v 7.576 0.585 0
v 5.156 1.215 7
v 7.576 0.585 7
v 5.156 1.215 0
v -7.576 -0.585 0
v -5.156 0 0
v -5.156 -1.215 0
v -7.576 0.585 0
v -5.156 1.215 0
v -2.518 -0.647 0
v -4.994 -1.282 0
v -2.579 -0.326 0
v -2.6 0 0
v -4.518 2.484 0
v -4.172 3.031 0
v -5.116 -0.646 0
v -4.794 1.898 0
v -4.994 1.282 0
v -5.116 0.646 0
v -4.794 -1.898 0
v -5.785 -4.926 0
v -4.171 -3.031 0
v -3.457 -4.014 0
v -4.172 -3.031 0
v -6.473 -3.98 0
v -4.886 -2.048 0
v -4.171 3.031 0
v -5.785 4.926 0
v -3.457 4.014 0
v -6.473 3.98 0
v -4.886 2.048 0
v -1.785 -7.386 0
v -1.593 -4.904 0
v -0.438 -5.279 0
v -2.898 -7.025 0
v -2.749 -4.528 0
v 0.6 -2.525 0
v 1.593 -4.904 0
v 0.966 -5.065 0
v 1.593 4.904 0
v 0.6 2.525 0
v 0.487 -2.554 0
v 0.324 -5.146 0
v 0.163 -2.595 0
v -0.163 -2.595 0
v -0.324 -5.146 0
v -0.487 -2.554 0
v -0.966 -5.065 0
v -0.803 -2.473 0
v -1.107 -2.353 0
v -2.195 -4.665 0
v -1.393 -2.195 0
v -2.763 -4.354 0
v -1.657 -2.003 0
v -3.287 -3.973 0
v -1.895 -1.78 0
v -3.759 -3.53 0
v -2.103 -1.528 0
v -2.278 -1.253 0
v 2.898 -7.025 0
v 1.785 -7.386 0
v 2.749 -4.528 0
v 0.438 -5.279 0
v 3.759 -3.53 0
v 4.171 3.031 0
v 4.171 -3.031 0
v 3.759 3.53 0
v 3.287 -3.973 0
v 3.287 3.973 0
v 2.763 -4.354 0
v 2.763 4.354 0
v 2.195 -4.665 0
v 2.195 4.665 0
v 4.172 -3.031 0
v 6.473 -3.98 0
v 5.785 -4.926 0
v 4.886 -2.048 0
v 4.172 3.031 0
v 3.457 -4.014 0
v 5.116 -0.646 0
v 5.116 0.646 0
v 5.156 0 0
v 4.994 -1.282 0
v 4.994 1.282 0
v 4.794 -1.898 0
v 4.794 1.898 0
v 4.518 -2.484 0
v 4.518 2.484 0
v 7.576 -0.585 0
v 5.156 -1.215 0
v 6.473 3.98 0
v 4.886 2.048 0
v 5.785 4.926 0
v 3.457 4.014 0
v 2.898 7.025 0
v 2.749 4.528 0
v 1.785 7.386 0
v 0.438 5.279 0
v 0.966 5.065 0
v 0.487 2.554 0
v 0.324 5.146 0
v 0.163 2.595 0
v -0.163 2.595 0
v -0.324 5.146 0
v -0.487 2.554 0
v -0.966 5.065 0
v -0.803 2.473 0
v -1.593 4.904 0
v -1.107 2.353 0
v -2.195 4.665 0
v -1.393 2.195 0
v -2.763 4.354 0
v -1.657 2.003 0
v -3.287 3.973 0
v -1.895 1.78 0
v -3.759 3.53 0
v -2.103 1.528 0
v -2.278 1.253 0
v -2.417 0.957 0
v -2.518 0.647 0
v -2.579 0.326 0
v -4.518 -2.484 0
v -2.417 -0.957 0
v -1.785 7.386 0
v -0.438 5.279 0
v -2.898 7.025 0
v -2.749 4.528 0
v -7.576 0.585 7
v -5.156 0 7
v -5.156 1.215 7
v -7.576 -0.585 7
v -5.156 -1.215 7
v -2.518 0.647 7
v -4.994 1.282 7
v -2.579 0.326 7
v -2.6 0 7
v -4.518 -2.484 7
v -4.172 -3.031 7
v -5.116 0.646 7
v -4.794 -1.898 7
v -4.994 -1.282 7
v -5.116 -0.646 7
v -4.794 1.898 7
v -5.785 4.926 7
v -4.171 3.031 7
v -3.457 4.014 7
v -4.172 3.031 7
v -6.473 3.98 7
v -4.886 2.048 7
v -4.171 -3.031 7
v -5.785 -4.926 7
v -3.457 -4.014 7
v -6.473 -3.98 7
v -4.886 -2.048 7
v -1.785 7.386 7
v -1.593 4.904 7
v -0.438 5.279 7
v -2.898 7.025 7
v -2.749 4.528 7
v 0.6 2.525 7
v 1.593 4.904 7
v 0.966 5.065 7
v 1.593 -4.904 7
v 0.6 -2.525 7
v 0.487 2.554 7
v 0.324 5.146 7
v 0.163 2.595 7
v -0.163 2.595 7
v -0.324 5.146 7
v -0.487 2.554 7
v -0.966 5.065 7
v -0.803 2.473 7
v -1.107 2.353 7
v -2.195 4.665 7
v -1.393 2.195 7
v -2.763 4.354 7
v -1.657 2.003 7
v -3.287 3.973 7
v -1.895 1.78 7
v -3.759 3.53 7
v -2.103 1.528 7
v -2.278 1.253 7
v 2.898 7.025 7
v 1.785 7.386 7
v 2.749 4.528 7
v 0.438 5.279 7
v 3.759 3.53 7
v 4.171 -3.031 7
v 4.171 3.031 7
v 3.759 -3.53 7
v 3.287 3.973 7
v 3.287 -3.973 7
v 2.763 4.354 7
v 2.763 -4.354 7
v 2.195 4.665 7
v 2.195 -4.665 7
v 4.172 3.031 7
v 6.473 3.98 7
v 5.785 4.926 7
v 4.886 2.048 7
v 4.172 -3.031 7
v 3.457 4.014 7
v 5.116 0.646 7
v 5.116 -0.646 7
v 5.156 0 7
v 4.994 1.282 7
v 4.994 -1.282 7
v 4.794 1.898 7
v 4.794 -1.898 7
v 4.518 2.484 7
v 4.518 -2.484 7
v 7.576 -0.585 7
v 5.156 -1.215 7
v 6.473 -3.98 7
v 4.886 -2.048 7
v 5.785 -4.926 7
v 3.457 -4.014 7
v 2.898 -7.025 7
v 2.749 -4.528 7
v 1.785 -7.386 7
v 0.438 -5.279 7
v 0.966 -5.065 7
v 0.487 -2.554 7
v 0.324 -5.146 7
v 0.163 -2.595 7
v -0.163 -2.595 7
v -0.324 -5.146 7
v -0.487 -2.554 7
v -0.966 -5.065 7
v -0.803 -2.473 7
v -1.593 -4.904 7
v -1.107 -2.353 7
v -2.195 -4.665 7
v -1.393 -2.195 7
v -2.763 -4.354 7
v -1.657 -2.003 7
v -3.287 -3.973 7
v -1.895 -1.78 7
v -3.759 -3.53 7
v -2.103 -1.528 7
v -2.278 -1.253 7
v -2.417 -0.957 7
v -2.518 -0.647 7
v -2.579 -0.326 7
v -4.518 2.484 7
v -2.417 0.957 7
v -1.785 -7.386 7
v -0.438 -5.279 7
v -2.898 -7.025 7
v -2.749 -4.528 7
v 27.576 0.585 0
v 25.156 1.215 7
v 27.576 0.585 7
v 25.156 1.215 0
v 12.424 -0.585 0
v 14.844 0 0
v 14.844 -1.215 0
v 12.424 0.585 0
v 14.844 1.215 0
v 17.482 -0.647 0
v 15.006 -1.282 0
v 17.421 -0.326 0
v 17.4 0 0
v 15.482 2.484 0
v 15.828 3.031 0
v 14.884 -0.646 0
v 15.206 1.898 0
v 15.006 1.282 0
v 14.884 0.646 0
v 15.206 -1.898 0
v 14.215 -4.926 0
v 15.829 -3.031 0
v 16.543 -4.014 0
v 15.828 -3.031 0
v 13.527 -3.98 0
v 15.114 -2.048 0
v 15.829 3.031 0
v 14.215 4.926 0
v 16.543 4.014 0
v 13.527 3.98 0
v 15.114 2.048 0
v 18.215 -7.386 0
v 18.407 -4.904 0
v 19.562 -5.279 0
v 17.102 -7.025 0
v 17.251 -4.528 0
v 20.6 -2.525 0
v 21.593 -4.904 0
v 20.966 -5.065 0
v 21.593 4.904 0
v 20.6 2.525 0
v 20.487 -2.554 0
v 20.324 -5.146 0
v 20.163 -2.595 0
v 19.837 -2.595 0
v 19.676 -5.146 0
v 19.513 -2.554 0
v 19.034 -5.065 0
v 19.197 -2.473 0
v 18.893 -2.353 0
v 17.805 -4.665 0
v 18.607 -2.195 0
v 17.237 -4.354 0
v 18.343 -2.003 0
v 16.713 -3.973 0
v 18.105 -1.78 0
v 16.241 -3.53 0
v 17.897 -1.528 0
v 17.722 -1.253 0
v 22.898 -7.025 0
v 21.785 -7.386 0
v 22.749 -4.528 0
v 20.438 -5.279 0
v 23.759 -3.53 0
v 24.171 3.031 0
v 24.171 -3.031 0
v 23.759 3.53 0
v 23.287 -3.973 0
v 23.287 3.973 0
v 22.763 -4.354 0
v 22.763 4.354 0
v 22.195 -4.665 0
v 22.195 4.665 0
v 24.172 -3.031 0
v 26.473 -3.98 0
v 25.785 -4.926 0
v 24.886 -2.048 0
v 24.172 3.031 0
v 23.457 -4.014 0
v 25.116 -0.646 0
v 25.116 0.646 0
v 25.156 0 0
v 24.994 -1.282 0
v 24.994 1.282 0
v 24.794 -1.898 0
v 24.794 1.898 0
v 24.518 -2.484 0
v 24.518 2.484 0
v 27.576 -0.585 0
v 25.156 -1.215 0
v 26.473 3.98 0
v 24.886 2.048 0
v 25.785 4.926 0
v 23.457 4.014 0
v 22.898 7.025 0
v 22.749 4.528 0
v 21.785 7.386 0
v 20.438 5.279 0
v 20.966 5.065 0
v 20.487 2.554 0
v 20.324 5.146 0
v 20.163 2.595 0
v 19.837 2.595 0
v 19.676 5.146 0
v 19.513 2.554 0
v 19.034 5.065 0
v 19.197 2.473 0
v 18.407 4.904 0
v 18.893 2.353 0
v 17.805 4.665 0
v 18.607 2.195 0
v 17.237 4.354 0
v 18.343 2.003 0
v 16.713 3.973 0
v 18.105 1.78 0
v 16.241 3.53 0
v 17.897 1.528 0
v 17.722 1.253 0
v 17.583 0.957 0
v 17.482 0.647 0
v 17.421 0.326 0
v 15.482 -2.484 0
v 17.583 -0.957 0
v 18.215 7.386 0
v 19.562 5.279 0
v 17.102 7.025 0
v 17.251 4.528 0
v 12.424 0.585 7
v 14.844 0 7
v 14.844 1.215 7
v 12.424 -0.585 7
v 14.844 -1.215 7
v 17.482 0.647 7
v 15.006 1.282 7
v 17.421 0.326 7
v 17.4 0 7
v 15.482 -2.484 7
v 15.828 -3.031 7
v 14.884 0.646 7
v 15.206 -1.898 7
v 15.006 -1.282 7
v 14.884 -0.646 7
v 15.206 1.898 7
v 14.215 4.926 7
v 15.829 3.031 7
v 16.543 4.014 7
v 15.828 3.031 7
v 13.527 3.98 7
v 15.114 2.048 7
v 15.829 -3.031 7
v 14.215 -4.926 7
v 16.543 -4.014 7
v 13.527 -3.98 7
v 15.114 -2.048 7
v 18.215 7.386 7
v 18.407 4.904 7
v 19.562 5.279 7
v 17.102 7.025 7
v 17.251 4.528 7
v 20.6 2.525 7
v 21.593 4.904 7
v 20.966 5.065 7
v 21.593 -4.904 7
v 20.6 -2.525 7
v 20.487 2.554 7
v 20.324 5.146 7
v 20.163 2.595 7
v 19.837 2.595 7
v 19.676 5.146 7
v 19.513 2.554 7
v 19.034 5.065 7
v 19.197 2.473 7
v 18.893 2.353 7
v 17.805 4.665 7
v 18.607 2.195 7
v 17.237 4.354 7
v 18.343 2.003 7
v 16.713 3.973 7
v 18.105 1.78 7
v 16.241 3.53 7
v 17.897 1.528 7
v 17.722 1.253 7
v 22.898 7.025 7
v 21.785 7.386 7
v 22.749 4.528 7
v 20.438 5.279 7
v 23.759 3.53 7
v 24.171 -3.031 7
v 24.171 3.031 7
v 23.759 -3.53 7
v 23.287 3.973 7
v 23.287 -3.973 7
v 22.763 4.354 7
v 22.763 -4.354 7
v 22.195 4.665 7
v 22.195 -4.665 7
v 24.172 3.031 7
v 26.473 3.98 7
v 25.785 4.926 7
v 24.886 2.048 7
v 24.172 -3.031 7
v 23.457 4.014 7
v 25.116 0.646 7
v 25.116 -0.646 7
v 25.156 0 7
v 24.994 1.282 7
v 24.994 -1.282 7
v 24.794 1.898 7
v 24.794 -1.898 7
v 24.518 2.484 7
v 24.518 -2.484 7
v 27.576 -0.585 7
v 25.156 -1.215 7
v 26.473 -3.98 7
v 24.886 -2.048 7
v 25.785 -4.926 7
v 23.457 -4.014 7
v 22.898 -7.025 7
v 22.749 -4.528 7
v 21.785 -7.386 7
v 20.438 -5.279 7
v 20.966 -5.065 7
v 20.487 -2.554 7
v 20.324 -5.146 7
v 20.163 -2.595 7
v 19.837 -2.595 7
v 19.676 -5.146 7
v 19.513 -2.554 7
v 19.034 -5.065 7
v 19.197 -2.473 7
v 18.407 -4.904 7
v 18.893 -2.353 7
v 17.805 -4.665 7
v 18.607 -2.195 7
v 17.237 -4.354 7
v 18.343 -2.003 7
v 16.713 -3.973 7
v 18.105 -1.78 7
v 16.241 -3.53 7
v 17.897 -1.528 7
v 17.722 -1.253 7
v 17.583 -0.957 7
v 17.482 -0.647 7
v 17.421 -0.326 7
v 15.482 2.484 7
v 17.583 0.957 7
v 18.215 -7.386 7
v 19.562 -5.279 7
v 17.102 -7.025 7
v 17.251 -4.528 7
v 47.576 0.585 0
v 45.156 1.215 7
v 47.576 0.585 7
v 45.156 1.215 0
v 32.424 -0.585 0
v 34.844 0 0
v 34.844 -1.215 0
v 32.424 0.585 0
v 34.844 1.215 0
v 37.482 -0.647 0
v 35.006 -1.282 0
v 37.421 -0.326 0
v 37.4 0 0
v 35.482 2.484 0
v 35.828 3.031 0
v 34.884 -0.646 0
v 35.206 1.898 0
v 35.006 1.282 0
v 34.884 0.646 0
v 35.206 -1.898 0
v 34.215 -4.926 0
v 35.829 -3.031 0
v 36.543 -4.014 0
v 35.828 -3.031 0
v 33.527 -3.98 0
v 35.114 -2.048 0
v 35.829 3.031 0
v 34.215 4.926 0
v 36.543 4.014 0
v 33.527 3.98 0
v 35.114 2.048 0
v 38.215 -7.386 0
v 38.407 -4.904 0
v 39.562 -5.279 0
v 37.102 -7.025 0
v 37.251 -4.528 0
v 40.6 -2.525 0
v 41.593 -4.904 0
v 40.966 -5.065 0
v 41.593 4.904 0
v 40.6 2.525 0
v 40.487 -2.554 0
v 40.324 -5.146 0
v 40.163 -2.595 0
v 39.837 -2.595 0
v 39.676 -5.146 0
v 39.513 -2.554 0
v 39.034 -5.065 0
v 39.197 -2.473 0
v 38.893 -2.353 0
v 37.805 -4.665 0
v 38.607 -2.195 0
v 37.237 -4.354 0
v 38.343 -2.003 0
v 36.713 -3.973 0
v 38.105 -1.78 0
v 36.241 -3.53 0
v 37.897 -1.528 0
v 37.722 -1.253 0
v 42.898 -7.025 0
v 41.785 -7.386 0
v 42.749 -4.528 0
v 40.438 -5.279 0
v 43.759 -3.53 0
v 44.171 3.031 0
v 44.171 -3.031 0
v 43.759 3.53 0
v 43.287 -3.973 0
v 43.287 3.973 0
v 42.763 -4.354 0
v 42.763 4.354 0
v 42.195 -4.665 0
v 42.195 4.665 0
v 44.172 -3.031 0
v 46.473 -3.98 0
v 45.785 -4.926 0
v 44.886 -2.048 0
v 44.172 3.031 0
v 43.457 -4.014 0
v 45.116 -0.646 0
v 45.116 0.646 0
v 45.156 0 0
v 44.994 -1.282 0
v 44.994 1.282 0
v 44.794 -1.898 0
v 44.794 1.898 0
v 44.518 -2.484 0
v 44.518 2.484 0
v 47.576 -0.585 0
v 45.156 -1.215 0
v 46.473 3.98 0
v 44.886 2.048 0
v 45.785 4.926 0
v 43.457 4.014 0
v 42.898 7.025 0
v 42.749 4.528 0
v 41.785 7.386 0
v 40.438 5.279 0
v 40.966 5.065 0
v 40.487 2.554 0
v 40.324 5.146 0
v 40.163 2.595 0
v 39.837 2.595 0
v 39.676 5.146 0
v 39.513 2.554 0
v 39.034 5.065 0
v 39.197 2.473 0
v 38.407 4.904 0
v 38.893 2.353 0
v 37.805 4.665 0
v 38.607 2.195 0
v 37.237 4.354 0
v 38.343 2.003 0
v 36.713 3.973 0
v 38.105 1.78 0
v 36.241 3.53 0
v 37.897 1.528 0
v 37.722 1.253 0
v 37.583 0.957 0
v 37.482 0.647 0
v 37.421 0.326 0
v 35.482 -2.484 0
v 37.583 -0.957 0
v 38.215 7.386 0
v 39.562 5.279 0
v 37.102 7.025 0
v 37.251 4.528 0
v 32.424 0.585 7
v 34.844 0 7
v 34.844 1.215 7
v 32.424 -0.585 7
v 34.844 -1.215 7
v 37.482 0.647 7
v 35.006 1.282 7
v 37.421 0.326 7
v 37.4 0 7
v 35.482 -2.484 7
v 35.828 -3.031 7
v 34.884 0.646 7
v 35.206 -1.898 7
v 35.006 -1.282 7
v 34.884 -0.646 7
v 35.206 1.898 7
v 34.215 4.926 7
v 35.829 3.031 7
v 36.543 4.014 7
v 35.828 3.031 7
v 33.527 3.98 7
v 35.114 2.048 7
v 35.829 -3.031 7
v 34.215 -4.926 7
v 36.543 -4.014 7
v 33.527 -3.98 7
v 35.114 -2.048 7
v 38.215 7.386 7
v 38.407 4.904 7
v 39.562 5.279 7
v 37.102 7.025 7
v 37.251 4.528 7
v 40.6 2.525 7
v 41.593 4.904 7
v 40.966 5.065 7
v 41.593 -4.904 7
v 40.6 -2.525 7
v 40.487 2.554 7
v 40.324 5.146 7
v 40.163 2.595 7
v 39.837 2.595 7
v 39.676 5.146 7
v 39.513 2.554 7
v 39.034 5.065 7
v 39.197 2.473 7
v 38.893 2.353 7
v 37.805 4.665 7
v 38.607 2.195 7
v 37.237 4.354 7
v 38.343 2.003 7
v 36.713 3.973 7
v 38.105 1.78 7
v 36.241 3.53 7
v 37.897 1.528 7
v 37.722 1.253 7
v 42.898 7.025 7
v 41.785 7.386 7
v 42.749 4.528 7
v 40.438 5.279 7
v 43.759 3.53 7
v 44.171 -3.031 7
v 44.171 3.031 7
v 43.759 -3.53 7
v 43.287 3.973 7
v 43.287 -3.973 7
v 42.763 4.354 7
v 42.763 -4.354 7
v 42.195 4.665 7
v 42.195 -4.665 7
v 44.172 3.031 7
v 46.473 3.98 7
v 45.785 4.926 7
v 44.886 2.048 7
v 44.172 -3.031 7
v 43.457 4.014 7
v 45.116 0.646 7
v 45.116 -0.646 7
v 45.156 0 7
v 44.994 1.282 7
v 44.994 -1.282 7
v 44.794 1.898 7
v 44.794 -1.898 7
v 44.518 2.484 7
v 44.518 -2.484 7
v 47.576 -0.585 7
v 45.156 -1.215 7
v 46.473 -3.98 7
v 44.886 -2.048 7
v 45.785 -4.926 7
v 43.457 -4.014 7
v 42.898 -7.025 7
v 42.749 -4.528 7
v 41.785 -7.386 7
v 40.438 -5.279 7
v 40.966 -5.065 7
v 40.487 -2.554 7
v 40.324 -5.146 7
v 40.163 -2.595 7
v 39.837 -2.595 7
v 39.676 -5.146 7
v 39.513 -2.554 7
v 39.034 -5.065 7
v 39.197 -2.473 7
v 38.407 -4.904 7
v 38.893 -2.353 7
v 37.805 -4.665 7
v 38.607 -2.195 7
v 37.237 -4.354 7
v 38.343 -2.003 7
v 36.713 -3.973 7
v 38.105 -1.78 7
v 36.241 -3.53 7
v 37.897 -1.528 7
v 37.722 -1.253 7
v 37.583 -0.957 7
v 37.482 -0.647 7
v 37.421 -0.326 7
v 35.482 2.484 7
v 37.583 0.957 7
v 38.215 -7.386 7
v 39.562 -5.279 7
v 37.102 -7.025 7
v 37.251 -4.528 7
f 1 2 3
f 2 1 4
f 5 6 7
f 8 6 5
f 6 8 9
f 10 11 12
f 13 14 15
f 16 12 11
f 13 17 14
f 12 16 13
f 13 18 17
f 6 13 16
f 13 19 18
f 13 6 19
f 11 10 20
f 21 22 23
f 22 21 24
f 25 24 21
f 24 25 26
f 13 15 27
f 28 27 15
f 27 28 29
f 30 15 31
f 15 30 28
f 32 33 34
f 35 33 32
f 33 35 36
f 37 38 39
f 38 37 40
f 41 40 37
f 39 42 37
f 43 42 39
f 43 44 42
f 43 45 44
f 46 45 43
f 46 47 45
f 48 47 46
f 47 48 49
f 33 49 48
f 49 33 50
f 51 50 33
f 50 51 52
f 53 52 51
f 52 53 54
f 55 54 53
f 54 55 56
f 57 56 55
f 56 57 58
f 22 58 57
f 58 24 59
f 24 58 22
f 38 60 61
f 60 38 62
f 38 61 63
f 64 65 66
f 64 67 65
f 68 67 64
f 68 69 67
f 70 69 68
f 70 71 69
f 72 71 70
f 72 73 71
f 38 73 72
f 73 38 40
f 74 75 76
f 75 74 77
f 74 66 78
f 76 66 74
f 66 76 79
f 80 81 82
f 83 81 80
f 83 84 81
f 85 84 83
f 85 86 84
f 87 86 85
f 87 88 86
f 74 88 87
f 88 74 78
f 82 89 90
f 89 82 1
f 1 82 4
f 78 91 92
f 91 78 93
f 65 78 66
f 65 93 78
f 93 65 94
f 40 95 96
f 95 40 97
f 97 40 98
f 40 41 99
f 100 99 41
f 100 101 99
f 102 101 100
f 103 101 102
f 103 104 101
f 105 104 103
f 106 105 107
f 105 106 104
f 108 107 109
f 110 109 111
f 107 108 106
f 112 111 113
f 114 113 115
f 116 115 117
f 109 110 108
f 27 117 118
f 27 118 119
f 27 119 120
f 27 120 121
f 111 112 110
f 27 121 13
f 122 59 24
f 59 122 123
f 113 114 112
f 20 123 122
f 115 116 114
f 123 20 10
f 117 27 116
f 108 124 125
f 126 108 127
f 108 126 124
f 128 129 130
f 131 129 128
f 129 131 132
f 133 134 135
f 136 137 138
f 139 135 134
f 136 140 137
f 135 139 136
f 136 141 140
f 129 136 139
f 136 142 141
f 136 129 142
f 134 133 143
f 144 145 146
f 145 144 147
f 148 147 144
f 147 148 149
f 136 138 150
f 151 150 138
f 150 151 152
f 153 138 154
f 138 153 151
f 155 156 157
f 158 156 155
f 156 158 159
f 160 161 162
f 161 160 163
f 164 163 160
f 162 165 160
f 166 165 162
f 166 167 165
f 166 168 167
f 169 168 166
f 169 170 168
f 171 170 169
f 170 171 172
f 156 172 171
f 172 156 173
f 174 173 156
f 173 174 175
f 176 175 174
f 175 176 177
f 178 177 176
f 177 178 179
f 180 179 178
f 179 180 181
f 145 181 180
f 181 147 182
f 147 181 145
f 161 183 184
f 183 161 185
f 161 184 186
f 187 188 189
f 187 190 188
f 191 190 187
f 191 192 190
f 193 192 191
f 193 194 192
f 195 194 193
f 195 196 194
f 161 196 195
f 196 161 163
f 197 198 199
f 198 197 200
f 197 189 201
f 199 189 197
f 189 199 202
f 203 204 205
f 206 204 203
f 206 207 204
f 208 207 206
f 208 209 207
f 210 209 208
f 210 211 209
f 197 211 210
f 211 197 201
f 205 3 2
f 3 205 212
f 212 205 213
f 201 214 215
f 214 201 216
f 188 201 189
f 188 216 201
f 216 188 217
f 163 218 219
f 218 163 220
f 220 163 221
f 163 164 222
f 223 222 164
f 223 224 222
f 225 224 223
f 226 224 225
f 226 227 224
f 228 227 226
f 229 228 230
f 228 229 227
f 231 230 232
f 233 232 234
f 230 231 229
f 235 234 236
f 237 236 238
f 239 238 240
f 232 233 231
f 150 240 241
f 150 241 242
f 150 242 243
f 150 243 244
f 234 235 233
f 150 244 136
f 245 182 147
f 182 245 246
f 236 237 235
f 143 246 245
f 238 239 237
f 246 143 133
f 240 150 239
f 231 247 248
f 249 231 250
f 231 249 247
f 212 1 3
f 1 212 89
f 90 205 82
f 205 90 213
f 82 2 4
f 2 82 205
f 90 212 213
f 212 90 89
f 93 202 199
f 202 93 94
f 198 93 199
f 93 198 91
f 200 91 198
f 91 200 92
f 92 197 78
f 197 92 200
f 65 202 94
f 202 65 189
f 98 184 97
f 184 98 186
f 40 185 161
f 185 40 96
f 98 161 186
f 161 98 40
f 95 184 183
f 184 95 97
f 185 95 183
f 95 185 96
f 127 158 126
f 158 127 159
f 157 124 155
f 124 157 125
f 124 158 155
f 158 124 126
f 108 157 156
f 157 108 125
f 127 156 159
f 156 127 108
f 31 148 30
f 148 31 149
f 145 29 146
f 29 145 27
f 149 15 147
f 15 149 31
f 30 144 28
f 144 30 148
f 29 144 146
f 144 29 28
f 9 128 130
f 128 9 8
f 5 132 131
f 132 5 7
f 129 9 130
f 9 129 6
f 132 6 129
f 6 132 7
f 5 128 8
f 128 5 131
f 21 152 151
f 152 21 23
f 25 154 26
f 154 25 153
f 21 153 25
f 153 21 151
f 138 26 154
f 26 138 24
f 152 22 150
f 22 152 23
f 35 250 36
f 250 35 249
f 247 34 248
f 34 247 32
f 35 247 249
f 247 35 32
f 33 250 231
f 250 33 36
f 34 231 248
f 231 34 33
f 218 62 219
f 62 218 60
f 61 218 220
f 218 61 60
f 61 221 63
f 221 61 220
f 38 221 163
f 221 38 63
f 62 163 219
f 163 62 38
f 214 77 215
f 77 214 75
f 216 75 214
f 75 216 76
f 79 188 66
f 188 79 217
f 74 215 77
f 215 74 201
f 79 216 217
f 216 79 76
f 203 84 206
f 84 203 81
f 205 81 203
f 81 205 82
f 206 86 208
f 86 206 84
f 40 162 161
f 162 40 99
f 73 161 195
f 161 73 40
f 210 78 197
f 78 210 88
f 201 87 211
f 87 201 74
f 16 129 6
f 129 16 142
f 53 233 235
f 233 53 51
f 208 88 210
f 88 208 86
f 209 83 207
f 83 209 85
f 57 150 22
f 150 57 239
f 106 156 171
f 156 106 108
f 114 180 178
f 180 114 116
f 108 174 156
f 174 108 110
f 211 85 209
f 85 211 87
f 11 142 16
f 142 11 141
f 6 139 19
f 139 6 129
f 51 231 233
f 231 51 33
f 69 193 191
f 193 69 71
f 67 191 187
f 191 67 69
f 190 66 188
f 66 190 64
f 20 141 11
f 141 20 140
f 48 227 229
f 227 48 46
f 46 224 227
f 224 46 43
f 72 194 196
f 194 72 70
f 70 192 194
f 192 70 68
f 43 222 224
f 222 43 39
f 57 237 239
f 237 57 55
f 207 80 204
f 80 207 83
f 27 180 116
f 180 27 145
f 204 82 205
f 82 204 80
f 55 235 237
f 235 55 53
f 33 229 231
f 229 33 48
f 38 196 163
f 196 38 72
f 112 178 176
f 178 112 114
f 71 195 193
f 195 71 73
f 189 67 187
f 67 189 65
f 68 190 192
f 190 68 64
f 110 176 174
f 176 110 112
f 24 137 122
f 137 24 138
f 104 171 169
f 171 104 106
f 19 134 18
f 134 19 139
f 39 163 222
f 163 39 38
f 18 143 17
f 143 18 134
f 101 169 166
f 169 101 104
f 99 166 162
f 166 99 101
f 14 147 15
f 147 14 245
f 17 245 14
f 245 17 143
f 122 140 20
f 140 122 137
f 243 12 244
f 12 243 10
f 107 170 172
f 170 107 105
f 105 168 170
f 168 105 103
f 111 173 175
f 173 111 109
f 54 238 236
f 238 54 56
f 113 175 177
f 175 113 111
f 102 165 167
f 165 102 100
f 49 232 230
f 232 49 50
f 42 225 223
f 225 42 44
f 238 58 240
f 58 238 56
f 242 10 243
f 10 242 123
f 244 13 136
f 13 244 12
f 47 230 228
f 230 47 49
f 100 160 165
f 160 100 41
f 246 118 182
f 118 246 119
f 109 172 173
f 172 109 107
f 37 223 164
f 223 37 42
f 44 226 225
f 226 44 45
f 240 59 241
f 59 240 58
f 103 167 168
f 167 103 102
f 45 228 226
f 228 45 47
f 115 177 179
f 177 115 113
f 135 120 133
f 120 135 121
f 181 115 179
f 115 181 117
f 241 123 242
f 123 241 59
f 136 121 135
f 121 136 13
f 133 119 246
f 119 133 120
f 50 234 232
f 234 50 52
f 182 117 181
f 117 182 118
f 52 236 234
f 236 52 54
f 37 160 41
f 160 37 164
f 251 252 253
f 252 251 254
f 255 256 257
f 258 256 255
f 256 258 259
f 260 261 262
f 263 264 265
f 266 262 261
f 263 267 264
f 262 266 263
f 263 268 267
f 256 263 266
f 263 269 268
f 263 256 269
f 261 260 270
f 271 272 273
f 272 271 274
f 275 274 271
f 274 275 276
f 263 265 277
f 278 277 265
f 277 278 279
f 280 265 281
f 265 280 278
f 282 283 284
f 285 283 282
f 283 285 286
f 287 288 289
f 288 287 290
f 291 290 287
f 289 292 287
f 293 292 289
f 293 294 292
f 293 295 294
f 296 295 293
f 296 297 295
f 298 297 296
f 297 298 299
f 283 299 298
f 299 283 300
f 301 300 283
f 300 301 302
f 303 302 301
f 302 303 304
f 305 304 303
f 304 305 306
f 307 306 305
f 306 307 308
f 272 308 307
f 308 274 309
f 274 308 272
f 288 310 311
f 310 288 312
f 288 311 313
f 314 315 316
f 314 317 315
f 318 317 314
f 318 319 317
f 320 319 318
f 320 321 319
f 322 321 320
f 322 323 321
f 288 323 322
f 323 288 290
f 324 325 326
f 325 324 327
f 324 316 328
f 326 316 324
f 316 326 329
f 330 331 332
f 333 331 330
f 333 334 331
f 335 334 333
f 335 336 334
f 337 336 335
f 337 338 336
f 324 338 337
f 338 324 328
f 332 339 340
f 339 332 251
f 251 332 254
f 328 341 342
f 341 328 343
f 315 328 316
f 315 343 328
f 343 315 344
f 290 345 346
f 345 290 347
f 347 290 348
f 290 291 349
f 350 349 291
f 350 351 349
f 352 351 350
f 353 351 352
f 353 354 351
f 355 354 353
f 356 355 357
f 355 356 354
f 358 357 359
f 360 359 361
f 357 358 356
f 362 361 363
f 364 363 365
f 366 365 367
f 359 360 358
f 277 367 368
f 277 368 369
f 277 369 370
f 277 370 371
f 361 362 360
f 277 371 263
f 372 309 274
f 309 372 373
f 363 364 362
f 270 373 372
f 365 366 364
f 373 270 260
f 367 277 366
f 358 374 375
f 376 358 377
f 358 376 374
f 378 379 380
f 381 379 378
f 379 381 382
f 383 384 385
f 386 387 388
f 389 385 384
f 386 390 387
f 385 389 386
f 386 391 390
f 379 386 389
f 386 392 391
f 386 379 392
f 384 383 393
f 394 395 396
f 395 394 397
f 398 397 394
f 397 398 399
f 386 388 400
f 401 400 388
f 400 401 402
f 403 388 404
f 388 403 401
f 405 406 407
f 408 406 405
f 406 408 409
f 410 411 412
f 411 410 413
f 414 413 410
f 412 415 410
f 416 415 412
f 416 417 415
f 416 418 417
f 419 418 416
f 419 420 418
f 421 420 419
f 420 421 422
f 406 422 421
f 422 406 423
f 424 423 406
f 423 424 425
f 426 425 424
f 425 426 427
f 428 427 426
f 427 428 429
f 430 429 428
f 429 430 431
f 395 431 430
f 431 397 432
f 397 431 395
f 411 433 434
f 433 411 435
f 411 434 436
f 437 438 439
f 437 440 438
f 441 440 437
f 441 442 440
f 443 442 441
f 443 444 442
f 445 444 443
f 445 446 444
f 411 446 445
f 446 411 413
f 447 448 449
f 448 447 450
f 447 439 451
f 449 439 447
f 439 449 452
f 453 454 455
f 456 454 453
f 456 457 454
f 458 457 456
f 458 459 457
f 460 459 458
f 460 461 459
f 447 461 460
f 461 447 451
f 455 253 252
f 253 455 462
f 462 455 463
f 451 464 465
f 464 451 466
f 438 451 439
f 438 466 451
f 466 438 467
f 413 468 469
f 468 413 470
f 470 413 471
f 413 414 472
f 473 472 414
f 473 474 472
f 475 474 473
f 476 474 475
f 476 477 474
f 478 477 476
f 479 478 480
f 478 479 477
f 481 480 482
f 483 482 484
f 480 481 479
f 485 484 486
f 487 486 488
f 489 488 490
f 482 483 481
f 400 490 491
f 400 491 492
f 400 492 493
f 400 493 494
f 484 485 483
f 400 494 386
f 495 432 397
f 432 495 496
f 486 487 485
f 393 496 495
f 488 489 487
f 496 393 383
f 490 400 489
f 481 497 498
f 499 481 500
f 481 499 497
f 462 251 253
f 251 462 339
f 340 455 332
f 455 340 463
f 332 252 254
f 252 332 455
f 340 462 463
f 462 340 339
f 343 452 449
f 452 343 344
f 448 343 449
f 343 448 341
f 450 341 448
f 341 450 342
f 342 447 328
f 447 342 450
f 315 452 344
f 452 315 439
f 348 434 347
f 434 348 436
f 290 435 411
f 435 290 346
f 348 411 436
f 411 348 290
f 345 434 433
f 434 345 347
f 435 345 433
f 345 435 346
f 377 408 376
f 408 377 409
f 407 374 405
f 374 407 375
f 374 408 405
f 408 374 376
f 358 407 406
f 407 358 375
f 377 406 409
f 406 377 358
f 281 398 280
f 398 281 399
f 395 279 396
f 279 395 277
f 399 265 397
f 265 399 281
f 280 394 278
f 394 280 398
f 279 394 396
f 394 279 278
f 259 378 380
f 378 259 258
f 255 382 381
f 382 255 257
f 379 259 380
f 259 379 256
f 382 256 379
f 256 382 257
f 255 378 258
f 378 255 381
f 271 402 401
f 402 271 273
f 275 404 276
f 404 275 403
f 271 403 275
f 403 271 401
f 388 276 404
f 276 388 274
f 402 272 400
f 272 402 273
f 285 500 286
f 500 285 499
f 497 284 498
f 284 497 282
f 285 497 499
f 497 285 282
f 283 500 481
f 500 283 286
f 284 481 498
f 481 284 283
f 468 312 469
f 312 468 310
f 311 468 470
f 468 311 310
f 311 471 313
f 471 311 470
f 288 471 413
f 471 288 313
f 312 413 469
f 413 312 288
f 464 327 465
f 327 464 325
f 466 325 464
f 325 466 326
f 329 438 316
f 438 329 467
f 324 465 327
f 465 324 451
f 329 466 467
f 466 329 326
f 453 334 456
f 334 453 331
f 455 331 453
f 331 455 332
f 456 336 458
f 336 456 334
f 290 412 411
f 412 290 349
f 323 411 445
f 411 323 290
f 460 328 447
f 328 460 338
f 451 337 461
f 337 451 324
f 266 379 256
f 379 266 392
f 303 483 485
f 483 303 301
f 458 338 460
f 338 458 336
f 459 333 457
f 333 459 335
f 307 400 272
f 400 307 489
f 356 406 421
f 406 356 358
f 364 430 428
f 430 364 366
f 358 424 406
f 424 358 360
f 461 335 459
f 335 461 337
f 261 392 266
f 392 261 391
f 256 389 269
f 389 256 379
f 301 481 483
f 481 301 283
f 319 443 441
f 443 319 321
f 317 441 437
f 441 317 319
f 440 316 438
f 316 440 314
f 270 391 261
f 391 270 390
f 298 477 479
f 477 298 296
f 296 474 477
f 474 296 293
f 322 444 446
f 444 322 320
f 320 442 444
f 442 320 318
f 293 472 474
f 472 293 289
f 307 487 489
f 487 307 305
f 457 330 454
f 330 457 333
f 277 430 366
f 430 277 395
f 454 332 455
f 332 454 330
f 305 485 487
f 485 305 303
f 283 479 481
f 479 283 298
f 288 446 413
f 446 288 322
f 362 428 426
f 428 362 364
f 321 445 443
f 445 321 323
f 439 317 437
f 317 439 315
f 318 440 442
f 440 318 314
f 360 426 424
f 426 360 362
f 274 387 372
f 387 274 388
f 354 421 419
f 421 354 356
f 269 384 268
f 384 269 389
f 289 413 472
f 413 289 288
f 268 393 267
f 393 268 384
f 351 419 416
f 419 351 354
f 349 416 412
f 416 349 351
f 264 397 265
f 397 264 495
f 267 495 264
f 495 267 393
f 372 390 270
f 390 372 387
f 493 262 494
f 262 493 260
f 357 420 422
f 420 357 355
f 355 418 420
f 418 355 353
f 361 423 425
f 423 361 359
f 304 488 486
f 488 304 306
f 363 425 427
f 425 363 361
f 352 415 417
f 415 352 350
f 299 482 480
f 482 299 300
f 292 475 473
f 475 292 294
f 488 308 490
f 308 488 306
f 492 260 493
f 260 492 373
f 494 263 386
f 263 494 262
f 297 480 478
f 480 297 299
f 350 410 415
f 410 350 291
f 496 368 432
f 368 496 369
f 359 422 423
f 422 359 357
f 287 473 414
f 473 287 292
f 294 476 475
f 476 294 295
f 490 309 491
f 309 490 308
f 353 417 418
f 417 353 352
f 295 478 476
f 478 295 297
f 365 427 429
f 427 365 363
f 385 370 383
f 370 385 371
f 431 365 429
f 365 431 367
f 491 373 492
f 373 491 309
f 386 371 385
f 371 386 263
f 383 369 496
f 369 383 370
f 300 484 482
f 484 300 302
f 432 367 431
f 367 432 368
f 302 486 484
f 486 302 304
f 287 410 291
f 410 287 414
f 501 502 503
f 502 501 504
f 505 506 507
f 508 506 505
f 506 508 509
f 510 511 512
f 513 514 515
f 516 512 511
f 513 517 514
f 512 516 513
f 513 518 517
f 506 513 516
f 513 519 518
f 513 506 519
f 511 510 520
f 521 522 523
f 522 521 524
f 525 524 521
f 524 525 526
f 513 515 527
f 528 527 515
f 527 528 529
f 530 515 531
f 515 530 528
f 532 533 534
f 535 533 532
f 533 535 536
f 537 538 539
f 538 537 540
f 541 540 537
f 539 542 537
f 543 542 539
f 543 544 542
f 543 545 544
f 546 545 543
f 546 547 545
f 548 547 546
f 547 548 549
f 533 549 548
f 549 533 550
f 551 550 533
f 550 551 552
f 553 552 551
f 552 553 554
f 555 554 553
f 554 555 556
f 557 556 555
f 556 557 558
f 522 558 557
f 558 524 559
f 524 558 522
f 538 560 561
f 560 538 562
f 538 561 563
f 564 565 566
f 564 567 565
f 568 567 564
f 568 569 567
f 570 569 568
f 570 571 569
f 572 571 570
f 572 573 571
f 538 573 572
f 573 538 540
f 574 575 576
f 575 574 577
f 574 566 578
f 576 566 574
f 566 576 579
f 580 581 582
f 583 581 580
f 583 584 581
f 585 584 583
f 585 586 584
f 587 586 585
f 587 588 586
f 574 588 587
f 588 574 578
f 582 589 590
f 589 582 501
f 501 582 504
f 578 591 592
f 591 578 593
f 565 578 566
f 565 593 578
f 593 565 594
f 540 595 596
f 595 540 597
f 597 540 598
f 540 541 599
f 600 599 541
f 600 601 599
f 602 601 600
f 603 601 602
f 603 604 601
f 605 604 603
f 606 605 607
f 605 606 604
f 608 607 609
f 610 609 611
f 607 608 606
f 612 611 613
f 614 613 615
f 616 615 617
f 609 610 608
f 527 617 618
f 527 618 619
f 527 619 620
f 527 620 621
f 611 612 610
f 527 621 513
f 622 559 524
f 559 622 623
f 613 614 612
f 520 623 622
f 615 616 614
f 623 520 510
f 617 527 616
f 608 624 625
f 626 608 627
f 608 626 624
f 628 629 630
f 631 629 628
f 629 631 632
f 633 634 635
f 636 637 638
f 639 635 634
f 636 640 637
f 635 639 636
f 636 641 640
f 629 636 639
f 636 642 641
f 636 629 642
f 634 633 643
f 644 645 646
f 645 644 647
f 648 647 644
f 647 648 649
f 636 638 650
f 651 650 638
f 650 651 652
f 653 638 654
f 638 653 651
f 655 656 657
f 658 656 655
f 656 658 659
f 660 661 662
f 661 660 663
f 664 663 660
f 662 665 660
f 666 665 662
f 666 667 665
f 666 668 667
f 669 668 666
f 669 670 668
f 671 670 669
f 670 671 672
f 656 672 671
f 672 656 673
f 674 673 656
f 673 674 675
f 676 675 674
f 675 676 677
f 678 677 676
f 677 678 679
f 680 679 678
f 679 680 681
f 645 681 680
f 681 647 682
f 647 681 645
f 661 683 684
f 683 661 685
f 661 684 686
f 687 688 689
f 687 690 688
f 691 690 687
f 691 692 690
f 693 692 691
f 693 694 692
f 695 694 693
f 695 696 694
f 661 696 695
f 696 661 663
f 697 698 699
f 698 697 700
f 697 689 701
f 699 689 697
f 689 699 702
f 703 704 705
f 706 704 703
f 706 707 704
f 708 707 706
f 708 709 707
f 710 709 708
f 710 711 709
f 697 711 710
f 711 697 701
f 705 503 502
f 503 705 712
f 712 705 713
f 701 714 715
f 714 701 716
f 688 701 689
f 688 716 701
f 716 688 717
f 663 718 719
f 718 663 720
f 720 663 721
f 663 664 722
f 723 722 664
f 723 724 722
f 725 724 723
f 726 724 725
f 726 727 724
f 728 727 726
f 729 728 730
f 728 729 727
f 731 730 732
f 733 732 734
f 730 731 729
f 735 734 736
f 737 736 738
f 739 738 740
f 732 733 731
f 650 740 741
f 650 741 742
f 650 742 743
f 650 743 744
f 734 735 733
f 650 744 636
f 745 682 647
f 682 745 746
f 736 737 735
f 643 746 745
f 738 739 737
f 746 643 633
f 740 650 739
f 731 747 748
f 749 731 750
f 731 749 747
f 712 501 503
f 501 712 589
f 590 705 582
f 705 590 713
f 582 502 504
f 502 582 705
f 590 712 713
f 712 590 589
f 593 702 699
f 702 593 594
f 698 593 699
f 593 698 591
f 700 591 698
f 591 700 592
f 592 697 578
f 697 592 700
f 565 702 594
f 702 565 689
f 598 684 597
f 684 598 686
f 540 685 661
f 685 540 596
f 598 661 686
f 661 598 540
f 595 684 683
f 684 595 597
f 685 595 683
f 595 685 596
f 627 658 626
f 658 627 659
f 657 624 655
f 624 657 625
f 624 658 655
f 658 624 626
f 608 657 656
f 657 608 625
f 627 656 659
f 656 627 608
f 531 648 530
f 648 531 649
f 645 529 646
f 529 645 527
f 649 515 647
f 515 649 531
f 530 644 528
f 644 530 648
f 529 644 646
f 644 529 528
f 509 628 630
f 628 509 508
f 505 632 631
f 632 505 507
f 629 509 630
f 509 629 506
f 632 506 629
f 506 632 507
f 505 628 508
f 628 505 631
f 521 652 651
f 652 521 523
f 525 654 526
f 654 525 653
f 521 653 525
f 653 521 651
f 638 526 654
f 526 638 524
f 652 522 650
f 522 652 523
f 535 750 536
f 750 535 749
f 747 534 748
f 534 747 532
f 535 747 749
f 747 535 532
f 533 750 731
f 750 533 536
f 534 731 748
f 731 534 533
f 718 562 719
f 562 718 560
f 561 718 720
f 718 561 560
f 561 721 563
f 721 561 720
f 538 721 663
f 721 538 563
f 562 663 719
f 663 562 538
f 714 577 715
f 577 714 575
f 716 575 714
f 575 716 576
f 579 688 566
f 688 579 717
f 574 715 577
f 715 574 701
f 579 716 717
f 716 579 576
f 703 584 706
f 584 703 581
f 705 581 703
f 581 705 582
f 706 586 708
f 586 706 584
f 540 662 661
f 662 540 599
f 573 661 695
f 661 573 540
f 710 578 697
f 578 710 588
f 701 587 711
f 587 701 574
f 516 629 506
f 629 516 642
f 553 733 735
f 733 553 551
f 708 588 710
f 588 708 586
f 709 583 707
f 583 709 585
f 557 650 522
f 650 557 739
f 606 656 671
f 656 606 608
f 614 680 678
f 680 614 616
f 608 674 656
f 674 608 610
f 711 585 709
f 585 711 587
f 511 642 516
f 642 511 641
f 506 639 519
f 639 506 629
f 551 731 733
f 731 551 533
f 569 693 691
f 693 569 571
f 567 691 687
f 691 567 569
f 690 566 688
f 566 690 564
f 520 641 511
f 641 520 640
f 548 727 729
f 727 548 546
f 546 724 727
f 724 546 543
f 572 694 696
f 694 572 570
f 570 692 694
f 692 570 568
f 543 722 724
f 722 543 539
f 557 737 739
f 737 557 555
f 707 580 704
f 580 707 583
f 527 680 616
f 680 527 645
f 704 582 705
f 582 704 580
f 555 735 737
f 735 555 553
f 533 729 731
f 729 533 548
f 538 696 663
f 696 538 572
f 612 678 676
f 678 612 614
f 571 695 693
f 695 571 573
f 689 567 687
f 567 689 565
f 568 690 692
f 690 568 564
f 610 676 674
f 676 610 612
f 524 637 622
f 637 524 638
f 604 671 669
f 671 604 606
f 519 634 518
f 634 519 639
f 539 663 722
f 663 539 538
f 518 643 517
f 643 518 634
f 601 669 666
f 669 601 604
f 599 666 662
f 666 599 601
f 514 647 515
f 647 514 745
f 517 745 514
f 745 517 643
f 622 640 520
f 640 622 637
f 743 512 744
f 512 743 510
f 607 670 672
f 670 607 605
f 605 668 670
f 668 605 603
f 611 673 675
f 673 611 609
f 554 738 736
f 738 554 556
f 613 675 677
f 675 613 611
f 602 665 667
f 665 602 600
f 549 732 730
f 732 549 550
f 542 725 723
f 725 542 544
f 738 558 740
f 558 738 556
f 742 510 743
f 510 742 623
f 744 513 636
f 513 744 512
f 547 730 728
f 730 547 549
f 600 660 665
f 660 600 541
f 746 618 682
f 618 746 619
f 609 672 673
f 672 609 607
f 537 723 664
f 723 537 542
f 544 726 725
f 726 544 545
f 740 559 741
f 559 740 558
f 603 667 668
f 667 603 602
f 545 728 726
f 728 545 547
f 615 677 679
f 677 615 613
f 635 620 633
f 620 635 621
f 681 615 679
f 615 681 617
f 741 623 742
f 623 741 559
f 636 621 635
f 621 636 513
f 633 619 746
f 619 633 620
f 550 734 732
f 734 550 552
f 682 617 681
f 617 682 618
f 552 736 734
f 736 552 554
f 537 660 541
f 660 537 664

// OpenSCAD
/*
  =============================================================================
  06_Pinhoes.scad - Engrenagens Pinhão (GEOMETRIA CORRIGIDA DEFINITIVA)
  =============================================================================
  Correções:
    - Dentes trapezoiodais que ultrapassam o pitch circle (addendum correto)
    - Diâmetro externo REAL do STL ≈ 2 × gear_tip_radius ≈ 15.15mm
    - D-shaft hole unificado com d_shaft_hole()
    - 3 pinhões separados (X, Y, Z) para impressão individual
  
  Resultado: 3 COMPONENTES CONECTADOS no STL (um por pinhão)
  
  Geometria:
    gear_teeth = 10
    rack_pitch = 4.0 mm
    pitch_radius ≈ 6.366 mm  (primitivo)
    root_radius  ≈ 5.155 mm  (raiz)
    tip_radius   ≈ 7.577 mm  (ponta do dente)
    outer_diameter ≈ 15.15 mm (medido do STL)
  =============================================================================
*/

include <00_Parametros.scad>;

// Renderização dos 3 pinhões dispostos lado a lado para impressão
// Pinhão X
color([1.0, 0.55, 0.1])
  translate([0, 0, 0])
    pinion_gear(thickness=7.0);

// Pinhão Y
color([1.0, 0.55, 0.1])
  translate([20, 0, 0])
    pinion_gear(thickness=7.0);

// Pinhão Z
color([1.0, 0.55, 0.1])
  translate([40, 0, 0])
    pinion_gear(thickness=7.0);
